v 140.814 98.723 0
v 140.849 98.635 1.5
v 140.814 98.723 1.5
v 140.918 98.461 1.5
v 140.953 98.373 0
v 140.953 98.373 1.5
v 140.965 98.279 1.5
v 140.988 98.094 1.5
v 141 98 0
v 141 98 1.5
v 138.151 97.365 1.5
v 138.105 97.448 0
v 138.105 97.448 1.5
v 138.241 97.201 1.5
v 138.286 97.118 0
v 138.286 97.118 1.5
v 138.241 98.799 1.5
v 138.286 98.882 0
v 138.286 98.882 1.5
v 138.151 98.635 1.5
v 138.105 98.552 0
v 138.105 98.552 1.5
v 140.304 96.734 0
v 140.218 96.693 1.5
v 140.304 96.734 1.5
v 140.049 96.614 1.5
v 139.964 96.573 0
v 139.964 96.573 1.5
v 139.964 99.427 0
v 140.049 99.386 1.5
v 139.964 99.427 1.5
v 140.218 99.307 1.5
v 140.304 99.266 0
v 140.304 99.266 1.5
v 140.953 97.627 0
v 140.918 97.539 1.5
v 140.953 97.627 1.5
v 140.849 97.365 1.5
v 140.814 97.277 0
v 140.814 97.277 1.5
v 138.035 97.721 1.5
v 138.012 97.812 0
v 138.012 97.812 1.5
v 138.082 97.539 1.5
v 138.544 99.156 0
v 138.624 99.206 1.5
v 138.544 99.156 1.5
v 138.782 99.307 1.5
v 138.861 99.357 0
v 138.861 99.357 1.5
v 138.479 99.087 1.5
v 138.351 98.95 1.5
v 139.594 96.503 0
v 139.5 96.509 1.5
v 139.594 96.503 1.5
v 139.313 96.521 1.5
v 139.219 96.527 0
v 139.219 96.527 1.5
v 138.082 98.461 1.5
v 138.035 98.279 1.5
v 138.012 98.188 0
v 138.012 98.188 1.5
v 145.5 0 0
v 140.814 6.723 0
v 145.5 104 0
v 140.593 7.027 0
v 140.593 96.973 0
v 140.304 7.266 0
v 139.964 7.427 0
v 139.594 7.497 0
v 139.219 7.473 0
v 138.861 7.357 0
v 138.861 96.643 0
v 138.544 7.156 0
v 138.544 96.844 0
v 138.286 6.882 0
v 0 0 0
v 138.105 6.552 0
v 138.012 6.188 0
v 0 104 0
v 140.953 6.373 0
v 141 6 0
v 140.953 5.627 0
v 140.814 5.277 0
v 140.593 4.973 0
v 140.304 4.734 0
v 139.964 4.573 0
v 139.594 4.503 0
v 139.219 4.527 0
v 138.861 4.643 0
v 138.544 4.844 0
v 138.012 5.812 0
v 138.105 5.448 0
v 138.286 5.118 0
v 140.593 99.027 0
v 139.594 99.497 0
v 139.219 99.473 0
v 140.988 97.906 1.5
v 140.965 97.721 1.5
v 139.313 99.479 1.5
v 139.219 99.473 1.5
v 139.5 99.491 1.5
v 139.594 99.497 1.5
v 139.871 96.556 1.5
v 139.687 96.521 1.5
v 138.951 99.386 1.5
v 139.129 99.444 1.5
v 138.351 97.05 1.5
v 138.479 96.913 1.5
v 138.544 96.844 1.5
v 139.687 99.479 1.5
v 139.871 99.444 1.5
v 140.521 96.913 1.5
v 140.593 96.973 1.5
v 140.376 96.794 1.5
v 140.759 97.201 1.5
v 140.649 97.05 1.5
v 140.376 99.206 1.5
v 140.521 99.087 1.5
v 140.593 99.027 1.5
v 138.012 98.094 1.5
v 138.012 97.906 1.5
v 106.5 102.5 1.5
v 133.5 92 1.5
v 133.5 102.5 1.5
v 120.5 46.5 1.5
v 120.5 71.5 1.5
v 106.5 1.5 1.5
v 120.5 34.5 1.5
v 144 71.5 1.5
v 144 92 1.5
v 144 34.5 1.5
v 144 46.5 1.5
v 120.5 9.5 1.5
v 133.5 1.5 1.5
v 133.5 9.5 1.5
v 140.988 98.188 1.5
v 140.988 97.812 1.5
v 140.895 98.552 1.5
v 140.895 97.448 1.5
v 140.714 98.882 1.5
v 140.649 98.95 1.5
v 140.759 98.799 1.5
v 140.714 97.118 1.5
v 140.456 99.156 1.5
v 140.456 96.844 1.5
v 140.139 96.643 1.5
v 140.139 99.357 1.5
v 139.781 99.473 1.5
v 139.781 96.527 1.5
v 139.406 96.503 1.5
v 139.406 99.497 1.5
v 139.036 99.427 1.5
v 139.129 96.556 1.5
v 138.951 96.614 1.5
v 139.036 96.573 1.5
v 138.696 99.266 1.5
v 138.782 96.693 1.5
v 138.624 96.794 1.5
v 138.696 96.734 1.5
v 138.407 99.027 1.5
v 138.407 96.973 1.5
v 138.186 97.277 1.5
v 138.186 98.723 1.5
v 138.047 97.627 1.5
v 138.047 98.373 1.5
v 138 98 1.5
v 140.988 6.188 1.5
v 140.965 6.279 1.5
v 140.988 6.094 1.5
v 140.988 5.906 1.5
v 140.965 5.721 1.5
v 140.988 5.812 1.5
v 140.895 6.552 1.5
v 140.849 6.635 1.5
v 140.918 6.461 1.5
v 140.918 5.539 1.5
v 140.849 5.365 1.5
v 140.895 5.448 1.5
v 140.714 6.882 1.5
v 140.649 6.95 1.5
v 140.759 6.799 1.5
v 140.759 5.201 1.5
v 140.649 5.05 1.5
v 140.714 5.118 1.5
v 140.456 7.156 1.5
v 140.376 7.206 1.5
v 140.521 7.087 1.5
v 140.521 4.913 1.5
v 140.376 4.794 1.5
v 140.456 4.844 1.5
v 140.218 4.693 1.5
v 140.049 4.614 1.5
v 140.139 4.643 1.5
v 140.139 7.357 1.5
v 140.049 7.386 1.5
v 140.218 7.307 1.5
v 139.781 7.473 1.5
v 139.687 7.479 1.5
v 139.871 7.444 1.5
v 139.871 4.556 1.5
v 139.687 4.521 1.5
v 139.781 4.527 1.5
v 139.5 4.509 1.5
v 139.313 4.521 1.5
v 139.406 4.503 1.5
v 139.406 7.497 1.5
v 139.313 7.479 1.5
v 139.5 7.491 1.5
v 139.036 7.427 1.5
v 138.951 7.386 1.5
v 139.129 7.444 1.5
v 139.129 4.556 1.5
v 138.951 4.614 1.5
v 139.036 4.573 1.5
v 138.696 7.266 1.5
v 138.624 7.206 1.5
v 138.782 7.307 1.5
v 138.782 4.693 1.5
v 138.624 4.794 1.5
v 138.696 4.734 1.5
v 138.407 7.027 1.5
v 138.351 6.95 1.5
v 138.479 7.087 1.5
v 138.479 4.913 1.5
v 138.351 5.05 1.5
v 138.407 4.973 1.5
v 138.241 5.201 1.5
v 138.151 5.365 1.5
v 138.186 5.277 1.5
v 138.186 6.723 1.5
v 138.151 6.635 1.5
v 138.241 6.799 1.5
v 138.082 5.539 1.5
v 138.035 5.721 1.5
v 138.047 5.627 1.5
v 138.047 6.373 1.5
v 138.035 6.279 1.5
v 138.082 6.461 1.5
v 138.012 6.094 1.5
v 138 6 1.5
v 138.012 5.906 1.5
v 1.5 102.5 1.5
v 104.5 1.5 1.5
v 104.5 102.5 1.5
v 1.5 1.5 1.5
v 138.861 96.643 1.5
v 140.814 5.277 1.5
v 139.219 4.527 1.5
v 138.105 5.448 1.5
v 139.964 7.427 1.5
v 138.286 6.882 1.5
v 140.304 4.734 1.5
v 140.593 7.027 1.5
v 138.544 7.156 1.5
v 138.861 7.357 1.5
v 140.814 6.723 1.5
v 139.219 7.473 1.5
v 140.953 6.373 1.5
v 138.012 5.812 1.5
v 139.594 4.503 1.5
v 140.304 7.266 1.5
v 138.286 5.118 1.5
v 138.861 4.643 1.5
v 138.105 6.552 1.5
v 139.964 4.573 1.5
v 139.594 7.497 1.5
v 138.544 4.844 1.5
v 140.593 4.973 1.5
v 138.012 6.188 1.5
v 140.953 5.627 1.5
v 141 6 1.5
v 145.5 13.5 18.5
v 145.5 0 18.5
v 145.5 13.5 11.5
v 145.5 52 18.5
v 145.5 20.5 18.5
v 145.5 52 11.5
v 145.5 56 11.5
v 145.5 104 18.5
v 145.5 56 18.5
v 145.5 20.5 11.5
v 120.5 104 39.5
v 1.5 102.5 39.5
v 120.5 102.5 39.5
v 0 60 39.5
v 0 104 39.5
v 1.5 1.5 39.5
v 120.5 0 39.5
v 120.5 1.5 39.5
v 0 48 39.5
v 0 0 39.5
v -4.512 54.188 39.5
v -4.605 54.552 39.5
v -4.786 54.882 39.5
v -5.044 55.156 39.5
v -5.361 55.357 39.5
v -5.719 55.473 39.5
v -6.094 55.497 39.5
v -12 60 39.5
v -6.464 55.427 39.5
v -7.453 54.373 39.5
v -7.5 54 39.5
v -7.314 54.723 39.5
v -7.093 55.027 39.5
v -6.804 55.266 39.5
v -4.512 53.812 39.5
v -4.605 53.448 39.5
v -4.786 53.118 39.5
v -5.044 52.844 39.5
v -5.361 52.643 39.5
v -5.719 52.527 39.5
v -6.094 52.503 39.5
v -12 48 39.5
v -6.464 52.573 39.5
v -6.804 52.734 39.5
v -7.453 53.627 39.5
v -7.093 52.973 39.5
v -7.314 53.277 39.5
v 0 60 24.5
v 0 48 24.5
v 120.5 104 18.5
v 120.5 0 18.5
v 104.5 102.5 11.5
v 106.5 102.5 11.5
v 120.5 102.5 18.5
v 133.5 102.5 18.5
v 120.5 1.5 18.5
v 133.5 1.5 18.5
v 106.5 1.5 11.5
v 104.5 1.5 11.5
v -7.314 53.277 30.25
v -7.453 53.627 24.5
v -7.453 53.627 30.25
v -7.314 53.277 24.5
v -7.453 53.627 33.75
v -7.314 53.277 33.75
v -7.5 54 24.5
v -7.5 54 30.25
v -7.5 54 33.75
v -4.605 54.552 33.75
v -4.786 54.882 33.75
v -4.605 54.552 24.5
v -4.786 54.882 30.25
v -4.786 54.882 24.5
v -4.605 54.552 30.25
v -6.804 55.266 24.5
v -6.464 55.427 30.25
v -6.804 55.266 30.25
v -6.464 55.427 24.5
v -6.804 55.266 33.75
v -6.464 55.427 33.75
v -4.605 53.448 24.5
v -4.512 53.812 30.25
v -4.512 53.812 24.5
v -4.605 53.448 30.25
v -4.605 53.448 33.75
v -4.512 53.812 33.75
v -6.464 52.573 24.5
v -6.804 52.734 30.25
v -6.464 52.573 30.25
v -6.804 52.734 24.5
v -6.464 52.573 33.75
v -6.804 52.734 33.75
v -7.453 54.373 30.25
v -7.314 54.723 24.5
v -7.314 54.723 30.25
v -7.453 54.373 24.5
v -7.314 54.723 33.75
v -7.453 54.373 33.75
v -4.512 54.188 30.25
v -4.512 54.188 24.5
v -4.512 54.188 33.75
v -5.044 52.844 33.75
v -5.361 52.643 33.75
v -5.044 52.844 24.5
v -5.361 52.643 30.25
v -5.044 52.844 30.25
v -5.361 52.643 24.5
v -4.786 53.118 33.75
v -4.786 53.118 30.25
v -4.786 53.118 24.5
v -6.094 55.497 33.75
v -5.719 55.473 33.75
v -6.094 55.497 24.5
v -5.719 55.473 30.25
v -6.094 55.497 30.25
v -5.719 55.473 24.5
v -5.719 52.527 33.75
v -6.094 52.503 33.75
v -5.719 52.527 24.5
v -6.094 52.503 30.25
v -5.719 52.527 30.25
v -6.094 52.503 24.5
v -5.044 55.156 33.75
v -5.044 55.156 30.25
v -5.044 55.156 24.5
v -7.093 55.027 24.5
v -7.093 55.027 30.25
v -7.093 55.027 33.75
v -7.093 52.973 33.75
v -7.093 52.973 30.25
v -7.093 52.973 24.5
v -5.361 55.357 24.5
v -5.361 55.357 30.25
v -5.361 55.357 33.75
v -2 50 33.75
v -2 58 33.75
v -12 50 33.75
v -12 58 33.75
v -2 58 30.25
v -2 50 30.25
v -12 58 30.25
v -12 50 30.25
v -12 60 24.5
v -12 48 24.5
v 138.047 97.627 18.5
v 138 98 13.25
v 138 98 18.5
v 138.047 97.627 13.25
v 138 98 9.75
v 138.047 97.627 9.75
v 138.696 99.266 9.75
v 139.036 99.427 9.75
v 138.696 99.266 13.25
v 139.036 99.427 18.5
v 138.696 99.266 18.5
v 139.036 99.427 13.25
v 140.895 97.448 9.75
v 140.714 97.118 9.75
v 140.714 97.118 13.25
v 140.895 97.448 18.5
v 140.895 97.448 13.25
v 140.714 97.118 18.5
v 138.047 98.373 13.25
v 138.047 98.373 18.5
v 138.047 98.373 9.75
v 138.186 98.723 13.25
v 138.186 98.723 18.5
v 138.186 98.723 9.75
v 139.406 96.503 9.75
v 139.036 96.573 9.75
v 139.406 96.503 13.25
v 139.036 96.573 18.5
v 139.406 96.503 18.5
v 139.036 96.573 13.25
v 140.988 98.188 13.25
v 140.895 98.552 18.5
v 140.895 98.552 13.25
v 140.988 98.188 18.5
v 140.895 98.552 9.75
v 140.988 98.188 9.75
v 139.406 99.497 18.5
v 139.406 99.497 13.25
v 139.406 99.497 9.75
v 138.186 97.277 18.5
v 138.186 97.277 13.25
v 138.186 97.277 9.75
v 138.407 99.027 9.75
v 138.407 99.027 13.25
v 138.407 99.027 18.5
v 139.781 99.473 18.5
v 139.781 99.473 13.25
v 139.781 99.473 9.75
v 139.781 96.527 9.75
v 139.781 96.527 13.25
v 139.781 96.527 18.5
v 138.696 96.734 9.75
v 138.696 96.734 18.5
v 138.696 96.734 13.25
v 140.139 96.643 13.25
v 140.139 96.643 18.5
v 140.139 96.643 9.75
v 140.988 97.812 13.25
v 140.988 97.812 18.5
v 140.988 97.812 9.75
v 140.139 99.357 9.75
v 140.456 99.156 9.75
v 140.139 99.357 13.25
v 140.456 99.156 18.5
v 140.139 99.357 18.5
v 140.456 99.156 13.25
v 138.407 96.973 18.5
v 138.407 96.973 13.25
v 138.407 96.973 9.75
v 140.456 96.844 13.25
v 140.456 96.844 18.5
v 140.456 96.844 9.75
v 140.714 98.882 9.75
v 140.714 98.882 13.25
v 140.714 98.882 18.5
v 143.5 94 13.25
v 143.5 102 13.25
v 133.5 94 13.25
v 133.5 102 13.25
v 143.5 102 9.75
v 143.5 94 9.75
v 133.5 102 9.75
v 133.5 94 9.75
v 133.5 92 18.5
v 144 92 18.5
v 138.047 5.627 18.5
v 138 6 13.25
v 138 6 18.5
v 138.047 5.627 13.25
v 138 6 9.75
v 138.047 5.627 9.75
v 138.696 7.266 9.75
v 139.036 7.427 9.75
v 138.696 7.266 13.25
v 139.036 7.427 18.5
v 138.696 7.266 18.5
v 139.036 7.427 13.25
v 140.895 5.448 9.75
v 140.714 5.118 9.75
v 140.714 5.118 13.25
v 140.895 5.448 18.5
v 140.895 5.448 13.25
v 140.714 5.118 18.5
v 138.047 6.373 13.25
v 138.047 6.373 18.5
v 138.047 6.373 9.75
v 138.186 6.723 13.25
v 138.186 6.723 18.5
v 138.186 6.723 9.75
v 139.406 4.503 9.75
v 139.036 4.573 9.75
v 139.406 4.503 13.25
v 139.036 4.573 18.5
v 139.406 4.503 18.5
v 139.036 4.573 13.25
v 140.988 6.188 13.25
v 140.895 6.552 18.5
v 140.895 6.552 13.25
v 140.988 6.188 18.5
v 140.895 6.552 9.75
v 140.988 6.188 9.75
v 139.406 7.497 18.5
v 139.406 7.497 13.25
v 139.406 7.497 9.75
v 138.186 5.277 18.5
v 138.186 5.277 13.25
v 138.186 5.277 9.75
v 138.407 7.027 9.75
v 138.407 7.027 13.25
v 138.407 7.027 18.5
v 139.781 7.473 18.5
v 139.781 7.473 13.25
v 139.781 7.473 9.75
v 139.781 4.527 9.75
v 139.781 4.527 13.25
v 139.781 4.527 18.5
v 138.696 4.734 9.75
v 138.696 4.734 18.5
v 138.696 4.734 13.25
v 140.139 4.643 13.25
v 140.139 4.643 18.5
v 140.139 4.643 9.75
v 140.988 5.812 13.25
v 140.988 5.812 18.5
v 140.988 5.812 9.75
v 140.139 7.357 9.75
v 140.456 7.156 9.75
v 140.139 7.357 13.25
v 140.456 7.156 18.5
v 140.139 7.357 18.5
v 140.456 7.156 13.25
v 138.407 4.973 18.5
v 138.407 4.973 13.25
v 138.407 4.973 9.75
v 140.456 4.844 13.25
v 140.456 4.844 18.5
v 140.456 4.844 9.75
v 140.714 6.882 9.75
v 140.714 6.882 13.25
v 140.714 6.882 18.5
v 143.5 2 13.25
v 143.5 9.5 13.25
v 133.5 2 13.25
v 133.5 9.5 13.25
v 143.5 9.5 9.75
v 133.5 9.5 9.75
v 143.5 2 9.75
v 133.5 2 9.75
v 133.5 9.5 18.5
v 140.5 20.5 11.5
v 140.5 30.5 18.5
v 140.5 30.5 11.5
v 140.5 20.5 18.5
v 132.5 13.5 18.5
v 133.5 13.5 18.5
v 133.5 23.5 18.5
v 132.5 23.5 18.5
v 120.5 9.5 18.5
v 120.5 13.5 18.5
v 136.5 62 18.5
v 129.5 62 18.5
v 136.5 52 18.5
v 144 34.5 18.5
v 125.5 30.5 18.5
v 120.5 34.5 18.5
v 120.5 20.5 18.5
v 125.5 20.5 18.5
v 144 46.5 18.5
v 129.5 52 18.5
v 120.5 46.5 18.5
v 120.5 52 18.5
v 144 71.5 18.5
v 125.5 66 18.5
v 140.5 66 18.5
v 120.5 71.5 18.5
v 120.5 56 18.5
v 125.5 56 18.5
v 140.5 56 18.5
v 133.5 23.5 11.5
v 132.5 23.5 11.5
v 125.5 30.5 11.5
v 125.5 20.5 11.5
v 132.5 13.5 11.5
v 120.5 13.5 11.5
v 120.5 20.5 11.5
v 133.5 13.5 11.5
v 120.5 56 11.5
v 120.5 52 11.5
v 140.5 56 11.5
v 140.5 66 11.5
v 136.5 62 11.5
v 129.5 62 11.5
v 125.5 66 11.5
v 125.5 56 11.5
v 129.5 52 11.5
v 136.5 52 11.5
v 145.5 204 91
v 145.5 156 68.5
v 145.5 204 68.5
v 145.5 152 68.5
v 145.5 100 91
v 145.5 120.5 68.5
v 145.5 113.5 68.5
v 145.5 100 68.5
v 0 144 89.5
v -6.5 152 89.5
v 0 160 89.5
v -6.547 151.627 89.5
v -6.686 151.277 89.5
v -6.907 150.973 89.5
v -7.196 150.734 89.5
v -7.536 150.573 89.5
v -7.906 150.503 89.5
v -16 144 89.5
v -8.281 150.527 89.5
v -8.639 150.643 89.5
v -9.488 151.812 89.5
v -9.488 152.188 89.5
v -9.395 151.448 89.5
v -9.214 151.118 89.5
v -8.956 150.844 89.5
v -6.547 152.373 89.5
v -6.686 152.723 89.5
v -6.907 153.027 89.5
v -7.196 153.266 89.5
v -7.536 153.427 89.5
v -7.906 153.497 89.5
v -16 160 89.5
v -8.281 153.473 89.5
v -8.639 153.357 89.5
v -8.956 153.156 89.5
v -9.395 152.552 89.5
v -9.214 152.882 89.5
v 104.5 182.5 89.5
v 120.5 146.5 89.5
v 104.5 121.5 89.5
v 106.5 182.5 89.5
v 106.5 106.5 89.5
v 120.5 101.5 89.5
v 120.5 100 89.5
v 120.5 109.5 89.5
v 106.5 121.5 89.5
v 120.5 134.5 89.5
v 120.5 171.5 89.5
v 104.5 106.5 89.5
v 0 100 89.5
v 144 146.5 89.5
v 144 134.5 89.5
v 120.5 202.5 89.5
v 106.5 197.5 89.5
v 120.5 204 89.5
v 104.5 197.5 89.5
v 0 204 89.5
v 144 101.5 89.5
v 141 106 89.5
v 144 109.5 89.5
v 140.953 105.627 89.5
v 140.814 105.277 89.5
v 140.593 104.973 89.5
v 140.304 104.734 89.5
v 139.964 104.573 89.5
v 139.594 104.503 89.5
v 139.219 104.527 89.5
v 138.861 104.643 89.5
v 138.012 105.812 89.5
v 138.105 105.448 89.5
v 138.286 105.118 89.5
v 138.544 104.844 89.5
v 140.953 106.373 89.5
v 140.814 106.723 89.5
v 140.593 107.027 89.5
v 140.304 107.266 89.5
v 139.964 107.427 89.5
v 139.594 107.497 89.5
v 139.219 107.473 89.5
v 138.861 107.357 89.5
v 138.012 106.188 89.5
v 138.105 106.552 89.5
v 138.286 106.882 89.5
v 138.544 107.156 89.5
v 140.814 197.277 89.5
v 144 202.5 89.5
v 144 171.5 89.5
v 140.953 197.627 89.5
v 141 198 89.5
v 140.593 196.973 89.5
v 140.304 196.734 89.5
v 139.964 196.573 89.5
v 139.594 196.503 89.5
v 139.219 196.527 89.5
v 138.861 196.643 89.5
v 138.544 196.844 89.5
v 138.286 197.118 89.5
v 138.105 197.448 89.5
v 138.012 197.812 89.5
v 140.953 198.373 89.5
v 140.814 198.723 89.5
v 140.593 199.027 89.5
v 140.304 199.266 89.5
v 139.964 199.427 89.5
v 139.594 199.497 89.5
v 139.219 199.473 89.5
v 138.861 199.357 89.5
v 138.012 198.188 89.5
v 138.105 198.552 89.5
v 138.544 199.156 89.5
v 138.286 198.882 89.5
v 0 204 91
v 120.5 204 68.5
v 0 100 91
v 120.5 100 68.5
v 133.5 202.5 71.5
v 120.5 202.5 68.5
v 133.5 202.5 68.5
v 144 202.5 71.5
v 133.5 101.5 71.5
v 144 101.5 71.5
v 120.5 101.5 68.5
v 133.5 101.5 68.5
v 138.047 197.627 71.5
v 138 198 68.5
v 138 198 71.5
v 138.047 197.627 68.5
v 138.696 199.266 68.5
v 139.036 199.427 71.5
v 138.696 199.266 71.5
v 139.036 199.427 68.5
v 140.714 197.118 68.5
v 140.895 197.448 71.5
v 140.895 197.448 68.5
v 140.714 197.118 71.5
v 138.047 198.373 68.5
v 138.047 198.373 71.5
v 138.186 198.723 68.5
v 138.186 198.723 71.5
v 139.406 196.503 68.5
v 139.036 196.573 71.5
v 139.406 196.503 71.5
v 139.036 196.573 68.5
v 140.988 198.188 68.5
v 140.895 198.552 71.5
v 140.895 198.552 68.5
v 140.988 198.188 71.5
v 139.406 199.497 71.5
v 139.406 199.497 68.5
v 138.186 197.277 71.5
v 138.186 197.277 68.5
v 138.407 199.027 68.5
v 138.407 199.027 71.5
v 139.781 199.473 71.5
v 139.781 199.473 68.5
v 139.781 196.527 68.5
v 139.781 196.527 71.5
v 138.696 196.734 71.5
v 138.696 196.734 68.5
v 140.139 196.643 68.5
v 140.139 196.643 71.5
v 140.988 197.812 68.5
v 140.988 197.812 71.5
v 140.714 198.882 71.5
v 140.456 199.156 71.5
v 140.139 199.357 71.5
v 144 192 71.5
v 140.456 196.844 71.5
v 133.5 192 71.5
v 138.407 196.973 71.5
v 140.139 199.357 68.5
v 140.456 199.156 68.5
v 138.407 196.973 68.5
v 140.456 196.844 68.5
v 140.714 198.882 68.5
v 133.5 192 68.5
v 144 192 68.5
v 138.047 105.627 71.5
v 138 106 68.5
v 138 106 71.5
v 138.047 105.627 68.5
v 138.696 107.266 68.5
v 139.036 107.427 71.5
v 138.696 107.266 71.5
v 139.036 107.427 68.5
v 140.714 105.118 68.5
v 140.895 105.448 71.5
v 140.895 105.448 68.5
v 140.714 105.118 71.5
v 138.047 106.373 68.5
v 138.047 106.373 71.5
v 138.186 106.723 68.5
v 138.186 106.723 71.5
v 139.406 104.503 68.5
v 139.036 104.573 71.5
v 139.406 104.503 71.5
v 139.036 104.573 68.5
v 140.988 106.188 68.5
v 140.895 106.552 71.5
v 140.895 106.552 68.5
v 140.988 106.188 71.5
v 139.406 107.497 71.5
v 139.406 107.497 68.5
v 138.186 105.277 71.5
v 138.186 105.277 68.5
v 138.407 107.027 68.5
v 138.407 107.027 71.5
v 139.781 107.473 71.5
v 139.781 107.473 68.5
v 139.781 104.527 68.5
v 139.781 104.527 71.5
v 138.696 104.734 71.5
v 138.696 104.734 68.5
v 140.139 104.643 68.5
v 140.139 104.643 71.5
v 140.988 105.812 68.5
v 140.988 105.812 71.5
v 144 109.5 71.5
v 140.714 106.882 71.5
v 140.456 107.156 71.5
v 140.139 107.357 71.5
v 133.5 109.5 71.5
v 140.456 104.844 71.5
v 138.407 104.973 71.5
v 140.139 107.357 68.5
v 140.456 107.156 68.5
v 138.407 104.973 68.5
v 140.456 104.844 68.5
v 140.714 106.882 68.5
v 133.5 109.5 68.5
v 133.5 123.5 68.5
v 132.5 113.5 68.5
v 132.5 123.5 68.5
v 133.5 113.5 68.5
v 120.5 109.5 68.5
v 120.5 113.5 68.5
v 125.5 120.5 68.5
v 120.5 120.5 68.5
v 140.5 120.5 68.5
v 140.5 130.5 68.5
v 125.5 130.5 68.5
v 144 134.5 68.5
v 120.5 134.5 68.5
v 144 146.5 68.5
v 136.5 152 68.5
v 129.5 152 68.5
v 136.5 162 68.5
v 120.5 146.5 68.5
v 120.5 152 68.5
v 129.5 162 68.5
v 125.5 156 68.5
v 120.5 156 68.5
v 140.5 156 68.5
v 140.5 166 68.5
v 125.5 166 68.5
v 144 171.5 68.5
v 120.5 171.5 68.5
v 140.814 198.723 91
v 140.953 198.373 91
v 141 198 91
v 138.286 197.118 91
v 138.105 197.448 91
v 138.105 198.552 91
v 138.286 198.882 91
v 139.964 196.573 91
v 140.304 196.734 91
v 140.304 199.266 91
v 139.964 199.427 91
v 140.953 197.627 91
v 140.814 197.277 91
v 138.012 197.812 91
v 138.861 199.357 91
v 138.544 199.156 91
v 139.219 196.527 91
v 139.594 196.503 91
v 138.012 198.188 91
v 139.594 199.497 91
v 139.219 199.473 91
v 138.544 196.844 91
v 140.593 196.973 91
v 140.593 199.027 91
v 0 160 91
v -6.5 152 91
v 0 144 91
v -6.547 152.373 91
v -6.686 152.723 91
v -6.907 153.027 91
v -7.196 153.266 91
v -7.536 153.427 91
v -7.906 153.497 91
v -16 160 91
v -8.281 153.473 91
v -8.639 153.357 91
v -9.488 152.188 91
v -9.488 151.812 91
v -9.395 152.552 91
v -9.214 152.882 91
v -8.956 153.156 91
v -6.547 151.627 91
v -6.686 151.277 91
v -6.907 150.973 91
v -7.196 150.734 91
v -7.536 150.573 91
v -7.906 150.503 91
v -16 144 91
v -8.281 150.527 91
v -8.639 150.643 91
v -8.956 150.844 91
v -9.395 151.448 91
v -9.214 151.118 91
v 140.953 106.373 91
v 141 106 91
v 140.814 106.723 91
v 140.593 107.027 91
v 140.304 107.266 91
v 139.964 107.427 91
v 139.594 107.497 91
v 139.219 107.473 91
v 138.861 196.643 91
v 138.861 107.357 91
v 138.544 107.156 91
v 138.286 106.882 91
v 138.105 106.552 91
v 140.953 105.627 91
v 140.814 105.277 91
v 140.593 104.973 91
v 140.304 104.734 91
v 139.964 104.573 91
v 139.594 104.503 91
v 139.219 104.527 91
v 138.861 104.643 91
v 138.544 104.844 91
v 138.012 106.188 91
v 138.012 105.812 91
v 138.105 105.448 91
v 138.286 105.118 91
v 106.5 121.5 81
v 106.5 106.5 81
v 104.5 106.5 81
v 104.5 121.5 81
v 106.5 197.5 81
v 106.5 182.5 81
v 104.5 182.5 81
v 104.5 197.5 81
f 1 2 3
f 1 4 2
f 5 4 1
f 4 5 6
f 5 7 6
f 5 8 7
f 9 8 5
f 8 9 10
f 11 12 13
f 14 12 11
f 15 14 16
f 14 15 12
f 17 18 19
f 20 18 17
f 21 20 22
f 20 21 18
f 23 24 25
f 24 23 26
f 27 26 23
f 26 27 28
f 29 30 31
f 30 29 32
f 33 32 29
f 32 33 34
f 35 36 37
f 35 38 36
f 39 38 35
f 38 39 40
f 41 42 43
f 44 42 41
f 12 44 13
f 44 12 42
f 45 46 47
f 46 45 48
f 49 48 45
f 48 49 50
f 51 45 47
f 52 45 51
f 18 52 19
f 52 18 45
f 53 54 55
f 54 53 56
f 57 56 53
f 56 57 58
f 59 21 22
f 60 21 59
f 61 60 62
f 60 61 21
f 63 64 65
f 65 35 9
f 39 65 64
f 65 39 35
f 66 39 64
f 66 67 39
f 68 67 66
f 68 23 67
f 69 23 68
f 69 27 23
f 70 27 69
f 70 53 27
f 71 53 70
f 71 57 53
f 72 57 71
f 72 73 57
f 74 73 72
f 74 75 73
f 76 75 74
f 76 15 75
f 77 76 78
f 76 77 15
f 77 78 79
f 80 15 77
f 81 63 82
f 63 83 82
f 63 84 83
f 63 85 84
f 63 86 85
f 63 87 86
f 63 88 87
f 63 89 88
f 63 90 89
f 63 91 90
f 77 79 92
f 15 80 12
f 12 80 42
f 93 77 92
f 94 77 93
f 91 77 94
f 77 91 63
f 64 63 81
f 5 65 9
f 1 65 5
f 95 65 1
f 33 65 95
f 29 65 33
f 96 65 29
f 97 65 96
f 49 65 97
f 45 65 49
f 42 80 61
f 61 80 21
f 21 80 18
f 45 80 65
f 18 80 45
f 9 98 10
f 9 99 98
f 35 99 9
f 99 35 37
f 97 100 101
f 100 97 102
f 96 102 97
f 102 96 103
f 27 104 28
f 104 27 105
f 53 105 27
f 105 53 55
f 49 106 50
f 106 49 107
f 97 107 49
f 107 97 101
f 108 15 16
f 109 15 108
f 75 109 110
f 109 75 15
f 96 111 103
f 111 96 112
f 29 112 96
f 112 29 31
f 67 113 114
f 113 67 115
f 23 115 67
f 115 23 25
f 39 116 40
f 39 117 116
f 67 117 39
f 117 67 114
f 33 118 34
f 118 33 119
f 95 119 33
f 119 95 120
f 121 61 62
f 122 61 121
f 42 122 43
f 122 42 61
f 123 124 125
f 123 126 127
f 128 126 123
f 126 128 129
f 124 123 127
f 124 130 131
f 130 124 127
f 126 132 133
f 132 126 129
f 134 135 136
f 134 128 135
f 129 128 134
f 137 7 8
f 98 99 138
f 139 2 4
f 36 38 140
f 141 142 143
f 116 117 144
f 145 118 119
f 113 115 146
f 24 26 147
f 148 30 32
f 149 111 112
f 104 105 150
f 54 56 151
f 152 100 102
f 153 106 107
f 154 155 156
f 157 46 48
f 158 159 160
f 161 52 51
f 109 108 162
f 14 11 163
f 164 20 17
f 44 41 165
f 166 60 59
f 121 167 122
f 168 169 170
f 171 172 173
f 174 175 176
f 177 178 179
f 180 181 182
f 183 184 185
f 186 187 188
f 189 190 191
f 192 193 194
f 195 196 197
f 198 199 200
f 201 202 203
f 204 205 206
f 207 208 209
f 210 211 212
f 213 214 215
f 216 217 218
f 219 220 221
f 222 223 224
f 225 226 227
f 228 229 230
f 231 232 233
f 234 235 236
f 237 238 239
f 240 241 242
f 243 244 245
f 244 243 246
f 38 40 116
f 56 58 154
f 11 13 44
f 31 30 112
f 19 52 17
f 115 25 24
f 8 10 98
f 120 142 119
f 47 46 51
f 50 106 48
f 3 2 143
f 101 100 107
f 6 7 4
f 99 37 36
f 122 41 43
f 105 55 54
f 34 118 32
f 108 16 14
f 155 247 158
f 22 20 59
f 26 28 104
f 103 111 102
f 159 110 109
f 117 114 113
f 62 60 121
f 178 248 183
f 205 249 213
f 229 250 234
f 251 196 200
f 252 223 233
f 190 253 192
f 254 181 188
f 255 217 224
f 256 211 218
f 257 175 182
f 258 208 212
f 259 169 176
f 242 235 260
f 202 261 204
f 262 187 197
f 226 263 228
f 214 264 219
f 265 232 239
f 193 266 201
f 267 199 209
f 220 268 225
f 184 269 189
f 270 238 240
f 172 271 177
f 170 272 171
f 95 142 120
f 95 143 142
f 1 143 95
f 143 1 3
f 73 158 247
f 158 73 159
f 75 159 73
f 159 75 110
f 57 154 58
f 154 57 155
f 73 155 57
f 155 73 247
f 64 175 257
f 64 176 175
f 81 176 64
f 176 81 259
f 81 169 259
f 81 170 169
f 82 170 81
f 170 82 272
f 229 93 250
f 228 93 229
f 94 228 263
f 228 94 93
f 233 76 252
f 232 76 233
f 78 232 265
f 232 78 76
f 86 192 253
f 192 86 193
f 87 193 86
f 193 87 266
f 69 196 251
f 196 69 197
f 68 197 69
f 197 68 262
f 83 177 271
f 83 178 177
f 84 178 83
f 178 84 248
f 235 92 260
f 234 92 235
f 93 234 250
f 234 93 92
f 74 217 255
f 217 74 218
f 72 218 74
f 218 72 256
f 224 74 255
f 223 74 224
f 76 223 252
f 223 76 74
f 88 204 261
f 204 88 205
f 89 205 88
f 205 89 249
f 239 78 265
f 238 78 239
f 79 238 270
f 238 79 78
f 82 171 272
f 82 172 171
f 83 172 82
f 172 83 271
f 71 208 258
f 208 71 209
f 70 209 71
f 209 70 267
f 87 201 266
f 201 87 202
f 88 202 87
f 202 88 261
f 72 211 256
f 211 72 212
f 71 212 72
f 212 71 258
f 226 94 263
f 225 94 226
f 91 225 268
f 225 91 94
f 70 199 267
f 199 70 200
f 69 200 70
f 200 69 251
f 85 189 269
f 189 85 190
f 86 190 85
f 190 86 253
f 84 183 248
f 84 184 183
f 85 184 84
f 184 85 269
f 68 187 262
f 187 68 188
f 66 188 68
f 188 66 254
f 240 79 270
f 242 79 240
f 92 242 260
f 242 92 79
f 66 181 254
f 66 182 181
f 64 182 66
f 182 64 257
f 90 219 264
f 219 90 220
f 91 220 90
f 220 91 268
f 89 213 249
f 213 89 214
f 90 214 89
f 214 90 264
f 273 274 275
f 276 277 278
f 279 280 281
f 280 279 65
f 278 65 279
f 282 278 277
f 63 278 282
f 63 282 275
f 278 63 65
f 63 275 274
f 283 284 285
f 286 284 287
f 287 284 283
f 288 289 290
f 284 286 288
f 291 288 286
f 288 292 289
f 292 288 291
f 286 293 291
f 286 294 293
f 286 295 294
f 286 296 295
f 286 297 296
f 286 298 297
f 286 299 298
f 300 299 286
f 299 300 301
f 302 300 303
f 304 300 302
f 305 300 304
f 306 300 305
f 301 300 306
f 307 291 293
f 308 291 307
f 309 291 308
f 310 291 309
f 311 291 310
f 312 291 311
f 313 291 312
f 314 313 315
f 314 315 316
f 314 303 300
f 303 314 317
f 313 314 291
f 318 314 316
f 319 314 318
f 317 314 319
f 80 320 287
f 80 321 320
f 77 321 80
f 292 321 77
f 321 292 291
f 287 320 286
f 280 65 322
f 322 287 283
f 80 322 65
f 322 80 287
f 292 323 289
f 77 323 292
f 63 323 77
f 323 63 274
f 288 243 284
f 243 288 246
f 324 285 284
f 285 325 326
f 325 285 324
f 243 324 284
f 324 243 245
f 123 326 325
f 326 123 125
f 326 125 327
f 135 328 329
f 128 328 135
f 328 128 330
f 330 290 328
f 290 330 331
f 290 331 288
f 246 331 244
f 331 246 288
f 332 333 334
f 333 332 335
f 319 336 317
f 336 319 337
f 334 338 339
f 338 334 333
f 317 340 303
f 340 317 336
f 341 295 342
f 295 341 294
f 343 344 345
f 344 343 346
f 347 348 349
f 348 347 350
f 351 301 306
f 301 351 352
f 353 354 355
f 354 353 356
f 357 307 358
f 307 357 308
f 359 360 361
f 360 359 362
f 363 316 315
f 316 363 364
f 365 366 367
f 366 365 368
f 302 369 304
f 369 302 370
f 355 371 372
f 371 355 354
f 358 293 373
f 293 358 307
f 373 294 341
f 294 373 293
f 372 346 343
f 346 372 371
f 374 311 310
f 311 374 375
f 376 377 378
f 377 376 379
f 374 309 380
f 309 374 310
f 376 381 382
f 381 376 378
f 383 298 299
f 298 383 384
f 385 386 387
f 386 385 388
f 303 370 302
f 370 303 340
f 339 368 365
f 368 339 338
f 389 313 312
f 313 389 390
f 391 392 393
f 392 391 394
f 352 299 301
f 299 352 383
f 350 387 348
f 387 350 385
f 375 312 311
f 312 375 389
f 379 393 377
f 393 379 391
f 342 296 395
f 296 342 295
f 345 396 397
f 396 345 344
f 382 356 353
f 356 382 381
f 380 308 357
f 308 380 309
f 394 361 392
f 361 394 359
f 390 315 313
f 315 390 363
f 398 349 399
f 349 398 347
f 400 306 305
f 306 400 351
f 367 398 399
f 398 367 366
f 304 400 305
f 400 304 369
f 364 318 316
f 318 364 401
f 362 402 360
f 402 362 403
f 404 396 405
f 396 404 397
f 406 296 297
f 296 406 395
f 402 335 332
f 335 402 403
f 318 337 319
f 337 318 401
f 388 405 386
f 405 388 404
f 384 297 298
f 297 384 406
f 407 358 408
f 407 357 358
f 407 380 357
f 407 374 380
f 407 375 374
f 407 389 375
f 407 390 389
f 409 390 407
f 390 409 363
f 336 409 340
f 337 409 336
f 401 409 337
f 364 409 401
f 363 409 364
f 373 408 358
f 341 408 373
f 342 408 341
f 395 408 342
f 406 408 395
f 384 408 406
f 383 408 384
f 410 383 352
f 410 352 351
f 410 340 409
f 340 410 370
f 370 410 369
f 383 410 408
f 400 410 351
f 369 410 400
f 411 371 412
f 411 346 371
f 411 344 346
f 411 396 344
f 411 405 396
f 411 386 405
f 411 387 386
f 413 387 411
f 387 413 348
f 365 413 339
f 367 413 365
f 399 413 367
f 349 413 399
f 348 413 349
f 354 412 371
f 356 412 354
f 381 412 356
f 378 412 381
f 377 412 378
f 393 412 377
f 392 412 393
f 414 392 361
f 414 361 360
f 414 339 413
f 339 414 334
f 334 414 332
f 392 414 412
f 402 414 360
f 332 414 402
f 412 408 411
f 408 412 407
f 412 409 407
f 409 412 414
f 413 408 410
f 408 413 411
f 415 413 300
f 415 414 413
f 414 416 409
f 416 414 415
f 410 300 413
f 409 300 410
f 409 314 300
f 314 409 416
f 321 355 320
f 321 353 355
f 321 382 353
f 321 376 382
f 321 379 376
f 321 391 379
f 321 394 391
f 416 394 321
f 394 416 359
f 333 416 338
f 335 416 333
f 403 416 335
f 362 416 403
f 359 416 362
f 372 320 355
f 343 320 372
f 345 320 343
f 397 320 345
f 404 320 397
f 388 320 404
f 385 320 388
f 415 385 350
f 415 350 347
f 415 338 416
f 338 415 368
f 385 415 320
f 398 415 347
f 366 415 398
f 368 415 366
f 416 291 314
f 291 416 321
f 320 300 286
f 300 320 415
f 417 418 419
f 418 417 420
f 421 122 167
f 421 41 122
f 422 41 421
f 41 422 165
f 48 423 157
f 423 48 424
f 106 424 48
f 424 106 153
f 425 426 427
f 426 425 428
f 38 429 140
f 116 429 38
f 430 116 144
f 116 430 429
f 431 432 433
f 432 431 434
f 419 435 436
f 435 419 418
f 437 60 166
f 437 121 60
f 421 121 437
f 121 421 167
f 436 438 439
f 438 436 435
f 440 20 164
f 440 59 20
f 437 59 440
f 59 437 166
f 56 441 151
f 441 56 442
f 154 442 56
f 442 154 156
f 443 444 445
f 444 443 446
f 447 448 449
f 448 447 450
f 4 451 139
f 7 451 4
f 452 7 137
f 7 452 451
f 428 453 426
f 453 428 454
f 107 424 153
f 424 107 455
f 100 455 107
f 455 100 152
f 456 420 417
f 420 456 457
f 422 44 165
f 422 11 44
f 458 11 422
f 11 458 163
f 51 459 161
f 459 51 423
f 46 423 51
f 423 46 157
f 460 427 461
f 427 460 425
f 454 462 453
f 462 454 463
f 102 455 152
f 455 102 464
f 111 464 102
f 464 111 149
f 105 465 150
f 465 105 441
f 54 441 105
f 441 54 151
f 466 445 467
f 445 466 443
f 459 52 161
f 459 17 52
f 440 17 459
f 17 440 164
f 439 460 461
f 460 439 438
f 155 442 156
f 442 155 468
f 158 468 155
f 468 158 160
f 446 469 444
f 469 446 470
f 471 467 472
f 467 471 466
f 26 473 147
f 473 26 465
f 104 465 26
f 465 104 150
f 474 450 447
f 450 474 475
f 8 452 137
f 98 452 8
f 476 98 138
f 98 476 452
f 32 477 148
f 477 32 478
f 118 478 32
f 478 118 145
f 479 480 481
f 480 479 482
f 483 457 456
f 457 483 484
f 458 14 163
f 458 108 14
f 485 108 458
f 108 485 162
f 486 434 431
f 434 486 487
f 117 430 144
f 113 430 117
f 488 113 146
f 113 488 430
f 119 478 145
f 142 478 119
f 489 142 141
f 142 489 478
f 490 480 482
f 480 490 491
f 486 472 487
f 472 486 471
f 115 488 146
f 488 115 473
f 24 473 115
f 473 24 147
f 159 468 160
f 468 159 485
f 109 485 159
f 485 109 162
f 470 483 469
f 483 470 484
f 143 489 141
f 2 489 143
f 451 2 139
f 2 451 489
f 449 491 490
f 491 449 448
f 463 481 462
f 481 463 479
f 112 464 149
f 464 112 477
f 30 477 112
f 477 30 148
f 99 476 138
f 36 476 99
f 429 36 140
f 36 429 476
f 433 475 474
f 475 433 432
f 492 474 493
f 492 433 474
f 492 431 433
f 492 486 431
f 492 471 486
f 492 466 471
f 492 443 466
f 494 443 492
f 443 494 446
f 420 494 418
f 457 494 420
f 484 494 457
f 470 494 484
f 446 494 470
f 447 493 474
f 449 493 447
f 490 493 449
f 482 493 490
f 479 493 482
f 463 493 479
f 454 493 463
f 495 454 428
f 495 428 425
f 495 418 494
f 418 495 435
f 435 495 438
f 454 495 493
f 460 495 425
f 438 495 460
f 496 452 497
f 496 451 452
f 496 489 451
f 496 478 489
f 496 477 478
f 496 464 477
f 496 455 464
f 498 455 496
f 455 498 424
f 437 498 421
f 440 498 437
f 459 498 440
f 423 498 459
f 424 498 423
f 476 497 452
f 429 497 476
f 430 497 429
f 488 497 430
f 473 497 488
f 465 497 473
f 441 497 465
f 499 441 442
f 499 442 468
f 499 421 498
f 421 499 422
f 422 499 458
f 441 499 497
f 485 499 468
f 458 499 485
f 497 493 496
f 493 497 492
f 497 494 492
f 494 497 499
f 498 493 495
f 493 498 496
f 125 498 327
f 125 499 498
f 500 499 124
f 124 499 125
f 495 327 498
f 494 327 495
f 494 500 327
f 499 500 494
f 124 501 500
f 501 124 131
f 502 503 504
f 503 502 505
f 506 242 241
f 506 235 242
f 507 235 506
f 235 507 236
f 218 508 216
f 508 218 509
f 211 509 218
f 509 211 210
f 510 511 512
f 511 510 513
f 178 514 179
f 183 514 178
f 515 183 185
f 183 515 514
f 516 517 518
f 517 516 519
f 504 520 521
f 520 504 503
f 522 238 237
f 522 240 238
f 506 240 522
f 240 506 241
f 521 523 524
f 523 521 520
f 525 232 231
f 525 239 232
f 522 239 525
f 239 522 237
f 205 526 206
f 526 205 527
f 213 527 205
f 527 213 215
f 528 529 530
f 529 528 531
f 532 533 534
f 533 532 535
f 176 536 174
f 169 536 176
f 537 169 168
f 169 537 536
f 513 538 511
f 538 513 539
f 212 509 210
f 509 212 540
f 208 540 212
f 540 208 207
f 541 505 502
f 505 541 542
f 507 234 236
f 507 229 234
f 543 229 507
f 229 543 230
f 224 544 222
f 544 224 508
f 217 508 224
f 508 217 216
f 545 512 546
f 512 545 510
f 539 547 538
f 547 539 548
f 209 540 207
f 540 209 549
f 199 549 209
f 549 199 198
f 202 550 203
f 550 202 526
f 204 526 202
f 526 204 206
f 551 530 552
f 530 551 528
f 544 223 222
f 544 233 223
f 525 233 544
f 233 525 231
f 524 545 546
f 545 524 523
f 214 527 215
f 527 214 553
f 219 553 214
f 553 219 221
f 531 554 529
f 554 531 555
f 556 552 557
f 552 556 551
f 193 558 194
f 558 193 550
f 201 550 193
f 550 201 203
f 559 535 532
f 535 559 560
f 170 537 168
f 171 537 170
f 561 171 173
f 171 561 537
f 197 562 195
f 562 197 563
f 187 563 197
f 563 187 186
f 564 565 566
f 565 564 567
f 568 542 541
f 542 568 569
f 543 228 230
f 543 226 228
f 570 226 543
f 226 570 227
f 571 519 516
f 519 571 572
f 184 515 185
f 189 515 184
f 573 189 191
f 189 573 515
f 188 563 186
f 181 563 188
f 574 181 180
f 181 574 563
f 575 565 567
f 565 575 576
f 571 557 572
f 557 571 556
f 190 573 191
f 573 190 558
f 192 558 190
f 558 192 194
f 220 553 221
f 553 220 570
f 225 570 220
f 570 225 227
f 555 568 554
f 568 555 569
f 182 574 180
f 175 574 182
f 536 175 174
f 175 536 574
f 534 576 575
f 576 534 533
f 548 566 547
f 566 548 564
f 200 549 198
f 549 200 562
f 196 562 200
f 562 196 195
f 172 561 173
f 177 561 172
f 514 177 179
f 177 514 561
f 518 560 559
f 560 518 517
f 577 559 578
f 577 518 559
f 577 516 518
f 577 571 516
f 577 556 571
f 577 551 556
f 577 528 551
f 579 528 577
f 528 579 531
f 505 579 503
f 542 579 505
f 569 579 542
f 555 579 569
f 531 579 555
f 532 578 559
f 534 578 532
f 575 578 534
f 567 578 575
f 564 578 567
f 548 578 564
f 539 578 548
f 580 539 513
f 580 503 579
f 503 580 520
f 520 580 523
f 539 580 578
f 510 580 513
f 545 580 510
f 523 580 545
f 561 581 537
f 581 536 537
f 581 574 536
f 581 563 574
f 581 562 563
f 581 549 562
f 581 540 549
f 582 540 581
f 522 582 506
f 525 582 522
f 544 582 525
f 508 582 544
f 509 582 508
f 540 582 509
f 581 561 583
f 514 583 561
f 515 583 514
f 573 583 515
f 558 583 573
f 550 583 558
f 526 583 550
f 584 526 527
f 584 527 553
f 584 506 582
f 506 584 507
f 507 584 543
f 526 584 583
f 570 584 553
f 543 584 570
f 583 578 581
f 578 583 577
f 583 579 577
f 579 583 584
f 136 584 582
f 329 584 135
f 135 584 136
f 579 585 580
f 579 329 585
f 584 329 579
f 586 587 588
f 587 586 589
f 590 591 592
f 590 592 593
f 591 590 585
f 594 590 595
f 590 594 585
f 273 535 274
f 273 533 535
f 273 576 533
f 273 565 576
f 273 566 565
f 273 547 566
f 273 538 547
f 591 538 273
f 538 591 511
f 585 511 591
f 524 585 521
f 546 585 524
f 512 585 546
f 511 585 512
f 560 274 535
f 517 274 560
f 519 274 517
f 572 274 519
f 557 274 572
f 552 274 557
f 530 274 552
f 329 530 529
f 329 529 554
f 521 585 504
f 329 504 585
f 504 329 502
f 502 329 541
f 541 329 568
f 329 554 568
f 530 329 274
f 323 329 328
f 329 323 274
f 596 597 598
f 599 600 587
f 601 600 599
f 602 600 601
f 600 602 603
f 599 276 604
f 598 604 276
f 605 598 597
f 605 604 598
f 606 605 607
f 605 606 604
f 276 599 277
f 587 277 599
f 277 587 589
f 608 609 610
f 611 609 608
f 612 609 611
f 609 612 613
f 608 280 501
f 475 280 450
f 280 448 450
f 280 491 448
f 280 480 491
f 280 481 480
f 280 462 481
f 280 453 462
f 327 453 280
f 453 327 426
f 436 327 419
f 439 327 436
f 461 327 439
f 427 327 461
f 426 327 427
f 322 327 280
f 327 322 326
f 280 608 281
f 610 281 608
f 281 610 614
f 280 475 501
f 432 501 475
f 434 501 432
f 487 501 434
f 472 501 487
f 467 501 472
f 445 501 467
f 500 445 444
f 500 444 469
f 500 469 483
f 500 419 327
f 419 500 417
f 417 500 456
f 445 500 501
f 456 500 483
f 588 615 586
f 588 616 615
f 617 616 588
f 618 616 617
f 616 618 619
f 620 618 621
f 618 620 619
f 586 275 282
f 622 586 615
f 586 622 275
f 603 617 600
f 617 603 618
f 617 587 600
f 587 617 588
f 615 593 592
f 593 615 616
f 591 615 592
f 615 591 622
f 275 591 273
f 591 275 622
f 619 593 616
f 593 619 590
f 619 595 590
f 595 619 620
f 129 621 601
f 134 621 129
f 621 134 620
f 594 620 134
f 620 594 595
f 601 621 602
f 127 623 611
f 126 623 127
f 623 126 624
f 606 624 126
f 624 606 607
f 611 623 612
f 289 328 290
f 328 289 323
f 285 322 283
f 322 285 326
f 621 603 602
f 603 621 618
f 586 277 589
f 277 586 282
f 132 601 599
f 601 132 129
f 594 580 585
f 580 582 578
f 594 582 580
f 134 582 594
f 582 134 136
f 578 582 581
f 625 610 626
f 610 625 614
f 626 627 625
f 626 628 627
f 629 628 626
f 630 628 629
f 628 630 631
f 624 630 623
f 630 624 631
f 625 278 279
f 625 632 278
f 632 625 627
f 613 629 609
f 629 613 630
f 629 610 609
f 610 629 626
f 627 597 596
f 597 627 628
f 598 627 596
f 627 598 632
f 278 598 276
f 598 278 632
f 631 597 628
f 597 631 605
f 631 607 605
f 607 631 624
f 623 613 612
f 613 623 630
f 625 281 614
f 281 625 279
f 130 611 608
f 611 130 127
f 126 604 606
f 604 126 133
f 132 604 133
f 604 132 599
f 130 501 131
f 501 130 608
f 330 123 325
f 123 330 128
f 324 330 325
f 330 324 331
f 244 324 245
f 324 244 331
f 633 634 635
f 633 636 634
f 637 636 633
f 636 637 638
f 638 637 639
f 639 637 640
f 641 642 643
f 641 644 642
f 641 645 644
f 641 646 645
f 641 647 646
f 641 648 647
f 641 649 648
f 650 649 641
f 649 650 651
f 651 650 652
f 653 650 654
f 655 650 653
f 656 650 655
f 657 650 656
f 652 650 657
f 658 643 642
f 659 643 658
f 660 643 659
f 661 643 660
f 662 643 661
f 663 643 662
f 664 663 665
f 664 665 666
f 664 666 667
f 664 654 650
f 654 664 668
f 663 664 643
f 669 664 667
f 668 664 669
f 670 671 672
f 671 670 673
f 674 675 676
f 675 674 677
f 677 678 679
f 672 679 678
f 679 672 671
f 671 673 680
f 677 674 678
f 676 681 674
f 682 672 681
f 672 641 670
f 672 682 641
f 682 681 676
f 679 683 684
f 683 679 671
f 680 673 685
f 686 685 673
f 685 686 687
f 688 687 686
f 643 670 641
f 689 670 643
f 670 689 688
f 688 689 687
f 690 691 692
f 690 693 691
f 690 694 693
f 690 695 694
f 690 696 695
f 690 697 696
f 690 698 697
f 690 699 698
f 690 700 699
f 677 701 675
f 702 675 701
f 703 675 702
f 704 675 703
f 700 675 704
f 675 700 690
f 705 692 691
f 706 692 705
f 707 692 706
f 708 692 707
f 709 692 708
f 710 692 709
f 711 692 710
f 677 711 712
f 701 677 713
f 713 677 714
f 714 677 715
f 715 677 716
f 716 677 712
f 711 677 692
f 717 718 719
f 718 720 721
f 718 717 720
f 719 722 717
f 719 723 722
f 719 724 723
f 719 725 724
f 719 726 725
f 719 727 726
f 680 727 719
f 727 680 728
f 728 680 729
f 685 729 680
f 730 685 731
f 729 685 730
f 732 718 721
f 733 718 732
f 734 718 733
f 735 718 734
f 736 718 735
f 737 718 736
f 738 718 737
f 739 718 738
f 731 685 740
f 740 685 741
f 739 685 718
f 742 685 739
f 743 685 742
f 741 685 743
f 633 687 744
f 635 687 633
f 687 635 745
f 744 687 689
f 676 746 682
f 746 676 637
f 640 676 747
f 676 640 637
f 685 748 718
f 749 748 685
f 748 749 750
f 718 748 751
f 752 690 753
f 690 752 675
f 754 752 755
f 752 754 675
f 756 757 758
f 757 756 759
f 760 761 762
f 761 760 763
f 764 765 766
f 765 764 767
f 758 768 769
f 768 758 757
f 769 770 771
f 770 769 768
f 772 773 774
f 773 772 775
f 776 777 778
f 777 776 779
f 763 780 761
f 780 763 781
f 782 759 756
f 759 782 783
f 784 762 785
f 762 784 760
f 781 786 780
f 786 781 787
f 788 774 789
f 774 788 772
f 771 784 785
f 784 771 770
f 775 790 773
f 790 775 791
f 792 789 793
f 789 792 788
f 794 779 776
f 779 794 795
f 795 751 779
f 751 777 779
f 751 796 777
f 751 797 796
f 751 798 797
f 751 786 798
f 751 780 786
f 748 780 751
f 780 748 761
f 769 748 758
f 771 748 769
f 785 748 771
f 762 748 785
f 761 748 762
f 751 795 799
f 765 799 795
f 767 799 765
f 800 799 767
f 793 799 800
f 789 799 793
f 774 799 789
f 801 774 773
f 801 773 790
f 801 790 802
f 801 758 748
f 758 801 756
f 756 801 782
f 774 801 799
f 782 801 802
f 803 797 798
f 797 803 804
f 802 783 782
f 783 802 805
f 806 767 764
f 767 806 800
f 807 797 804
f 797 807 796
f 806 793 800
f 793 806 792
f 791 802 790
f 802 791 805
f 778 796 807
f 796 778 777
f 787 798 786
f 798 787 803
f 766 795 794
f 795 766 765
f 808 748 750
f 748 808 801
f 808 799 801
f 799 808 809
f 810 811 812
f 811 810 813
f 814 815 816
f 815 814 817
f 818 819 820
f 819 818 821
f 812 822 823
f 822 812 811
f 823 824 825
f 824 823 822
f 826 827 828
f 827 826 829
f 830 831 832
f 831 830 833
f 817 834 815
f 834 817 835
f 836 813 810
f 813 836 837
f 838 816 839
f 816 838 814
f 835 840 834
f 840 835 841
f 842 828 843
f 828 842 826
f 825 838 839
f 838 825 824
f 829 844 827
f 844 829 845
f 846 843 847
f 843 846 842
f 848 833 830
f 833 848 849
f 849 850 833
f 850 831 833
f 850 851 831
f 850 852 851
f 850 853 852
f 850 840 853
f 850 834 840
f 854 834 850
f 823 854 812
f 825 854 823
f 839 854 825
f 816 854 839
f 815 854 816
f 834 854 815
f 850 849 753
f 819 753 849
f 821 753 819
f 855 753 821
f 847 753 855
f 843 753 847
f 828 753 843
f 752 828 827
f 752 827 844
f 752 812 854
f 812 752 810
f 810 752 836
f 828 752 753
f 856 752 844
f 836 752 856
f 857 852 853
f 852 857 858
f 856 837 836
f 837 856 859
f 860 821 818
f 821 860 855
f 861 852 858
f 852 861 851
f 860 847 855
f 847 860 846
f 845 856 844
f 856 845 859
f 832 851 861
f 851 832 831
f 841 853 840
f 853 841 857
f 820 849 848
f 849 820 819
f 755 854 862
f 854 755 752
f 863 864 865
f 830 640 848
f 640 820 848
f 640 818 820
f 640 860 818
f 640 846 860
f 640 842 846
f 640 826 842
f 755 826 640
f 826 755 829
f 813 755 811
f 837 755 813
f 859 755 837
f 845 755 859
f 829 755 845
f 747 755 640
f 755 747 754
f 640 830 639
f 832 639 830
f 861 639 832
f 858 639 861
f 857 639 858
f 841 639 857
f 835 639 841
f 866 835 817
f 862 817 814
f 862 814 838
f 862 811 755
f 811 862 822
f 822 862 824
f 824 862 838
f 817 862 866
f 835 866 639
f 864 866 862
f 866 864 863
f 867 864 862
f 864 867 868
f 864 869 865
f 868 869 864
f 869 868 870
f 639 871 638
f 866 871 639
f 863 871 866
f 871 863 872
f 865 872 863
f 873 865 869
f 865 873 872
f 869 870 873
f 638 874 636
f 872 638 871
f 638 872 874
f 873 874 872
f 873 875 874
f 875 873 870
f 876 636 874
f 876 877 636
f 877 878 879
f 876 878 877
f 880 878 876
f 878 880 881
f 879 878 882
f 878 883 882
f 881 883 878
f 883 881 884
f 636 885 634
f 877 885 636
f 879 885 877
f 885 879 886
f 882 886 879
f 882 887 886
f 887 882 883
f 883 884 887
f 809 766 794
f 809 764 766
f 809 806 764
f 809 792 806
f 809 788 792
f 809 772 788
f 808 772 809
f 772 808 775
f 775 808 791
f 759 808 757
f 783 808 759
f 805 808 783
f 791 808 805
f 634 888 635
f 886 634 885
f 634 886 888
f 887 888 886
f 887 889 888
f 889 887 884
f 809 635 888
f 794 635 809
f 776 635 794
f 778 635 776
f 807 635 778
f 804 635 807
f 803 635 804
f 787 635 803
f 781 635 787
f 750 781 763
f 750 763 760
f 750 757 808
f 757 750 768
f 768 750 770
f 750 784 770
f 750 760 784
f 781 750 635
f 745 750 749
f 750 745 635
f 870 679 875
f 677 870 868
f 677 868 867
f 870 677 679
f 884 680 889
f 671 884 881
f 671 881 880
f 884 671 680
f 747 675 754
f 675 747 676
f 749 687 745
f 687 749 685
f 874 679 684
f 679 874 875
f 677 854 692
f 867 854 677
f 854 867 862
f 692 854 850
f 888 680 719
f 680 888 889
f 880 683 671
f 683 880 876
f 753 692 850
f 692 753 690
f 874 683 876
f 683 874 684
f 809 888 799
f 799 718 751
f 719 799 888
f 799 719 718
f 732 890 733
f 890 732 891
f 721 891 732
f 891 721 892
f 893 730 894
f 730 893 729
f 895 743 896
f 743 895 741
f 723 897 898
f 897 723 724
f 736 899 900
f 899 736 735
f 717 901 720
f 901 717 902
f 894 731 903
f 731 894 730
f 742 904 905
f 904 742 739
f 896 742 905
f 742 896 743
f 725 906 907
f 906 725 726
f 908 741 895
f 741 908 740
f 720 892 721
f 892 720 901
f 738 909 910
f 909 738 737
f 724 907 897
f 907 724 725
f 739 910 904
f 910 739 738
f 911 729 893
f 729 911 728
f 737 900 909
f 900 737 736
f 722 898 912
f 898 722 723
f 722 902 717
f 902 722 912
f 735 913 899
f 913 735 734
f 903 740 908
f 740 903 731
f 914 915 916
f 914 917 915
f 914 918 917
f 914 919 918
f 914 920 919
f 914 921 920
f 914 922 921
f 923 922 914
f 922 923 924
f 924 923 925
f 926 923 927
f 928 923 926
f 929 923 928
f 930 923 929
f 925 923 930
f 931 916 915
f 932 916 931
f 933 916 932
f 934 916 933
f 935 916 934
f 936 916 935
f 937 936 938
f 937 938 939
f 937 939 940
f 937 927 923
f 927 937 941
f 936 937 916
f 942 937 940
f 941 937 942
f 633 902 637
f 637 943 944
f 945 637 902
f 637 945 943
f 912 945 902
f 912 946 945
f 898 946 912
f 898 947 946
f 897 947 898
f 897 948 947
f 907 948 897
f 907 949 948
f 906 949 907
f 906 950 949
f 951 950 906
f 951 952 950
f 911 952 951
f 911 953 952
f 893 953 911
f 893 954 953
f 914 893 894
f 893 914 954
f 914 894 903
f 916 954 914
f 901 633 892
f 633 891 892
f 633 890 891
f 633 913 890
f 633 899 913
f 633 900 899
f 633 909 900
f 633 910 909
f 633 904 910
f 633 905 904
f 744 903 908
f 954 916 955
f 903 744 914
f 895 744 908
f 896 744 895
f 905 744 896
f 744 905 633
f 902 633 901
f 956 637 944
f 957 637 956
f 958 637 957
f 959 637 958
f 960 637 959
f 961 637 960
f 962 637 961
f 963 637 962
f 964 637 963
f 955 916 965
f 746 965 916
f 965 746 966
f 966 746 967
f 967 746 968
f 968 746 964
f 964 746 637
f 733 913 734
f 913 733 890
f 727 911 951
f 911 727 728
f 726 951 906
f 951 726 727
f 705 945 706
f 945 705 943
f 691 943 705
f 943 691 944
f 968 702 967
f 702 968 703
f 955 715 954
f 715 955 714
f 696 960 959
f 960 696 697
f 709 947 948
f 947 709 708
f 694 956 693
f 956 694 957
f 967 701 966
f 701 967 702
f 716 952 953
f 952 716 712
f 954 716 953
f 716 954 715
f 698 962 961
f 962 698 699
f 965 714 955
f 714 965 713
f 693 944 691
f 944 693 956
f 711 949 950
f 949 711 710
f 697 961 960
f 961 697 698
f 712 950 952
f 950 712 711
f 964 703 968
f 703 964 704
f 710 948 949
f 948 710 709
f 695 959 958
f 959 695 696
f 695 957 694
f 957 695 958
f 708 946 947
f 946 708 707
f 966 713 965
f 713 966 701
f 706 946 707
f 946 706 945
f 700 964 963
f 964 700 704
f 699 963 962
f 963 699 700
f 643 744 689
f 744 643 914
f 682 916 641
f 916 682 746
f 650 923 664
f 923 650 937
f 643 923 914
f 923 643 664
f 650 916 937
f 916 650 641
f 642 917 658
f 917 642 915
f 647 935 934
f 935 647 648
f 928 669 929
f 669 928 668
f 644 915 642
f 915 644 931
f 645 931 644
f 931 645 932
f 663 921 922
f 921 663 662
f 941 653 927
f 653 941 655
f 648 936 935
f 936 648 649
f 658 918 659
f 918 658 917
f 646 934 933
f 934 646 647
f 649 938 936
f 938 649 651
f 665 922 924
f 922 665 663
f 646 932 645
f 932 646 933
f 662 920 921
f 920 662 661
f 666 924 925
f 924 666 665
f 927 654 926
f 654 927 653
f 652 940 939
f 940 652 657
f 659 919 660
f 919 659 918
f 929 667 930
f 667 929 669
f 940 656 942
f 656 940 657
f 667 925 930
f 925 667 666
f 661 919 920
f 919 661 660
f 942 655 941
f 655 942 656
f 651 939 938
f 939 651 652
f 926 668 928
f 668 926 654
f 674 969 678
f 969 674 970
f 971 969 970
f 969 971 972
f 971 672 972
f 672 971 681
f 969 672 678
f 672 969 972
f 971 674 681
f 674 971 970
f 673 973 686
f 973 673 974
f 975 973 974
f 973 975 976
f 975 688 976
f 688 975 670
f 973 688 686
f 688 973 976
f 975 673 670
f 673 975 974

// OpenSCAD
$fn=25;


powerSupplyWidth = 101;
powerSupplyDepth = 99;
powerSupplyHeight = 36;




nutBoxHeight = 15;
screwRange = 1.5;
screwLength = 40;
nutRange = 4;
nutHeight = 3.5;

boxMargin = 1;

wallThickness = 1.5;
bottomThickness = 1.5;

widthMargin = 16;
antiPullGuiderWidth = 25;
antiPullOpeningY = 10;
antiPullOpeningHeight = 7;



cutHeight = antiPullOpeningY + antiPullOpeningHeight + bottomThickness;


// Bottom Part
difference() {
    box();
    translate([powerSupplyWidth + widthMargin + boxMargin * 2 + wallThickness, 0, cutHeight])
    cube([500, 500, 500]);
}


// Top part
translate([0, 100, 50])
{
    intersection() {
        box();
        translate([powerSupplyWidth + widthMargin + boxMargin * 2 + wallThickness, 0, cutHeight])
        cube([500, 500, 500]);
    }
    
    translate([0, 0, powerSupplyHeight + boxMargin * 2 + bottomThickness])
    {
        difference() {
            cube([
                powerSupplyWidth + widthMargin + antiPullGuiderWidth + boxMargin * 2 + wallThickness, 
                powerSupplyDepth + (boxMargin + wallThickness) * 2,
                bottomThickness
            ]);
              translate([powerSupplyWidth + widthMargin + antiPullGuiderWidth + boxMargin * 2 + wallThickness - 6, 
            powerSupplyDepth + (boxMargin + wallThickness) * 2 - 6, 
            0]) {
                cylinder(r=screwRange, h=bottomThickness);
                translate([0, -92, 0])
                cylinder(r=screwRange, h=bottomThickness);
            }
        }

        translate([-16, powerSupplyDepth/2 + (boxMargin + wallThickness) - 16 /2, 0])
        difference() {
            cube([
                16,
                16,
                bottomThickness
            ]);
            translate([8, 8, 0])
            cylinder(h=bottomThickness, r=screwRange);
        }
        
        holderWidth = 15;
        translate([powerSupplyWidth + boxMargin * 2 + wallThickness, wallThickness + 5, bottomThickness - 10]) {
            cube([2, holderWidth, 10]);
            translate([0, powerSupplyDepth + boxMargin * 2 - 5 * 2 - holderWidth, 0])
            cube([2, holderWidth, 10]);
        }
    }
}


module box() {

    difference() {
        cube([
            powerSupplyWidth + widthMargin + antiPullGuiderWidth + boxMargin * 2 + wallThickness, 
            powerSupplyDepth + (boxMargin + wallThickness) * 2,
            powerSupplyHeight + boxMargin * 2 + bottomThickness, 
        ]);
        translate([wallThickness, wallThickness, bottomThickness]) {
            cube([
                powerSupplyWidth + widthMargin + antiPullGuiderWidth + (boxMargin) * 2, 
                powerSupplyDepth + (boxMargin) * 2,
                powerSupplyHeight + boxMargin * 2, 
            ]);
        }
        
        translate([powerSupplyWidth + widthMargin + antiPullGuiderWidth + boxMargin * 2 + wallThickness - 6, 
        powerSupplyDepth + (boxMargin + wallThickness) * 2 - 6, 
        0]) {
            cylinder(r=screwRange, h=bottomThickness);
            translate([0, -92, 0])
            cylinder(r=screwRange, h=bottomThickness);
        }
    }


    // Connection points
    translate([
        0, 
        powerSupplyDepth / 2 + (boxMargin + wallThickness) + 16/2, 
        powerSupplyHeight + boxMargin * 2 + bottomThickness - nutBoxHeight])
    {
        rotate([0, 0, 180])
        connectionPoint(screwRange, screwLength, nutRange, nutHeight, nutBoxHeight);
    }


    translate([
        powerSupplyWidth + widthMargin + antiPullGuiderWidth + boxMargin * 2 + wallThickness, 
        powerSupplyDepth + (boxMargin + wallThickness) * 2, 
        bottomThickness])
    {
        rotate([0, 0, 180])
        {
            
            connectionPoint(screwRange, screwLength, nutRange, nutHeight, cutHeight - bottomThickness + 3);
            translate([0, 92, 0])
            connectionPoint(screwRange, screwLength, nutRange, nutHeight, cutHeight - bottomThickness + 3);
        }
    }




    translate([powerSupplyWidth + boxMargin * 2 + wallThickness, wallThickness, bottomThickness]) {
        cube([2, powerSupplyDepth + boxMargin * 2, 10]);
        
      
        translate([widthMargin, 0, 0]) {
            translate([0, 8, 0])            
            antiPullGuider(antiPullGuiderWidth, 25, powerSupplyHeight + 2 * boxMargin, 7, antiPullOpeningHeight, antiPullOpeningY);
            translate([0, 45, 0])
            antiPullGuider(antiPullGuiderWidth, 25, powerSupplyHeight + 2 * boxMargin, 4, antiPullOpeningHeight, antiPullOpeningY);


            translate([antiPullGuiderWidth - wallThickness, 0, 0]) {
                cube([wallThickness, 10, powerSupplyHeight + boxMargin * 2]);
                translate([0, 30, 0])
                cube([wallThickness, 15, powerSupplyHeight + boxMargin * 2]);
                translate([0, 25 + 40, 0])
                cube([wallThickness, powerSupplyDepth + boxMargin * 2 - (25 + 40),      powerSupplyHeight + boxMargin * 2]);
            }
            

        }
    }
}




module connectionPoint(screwRange, screwLength, nutRange, nutHeight, height) {
    padding = 3 + 1.5;
    width = screwRange * 2 + padding * 2;
    depth = screwRange * 2 + padding * 2;
    
    difference() {
        cube([width, depth, height]);
        
        translate([width / 2, depth / 2, 0])
        {
            translate([0, 0, height - screwLength])
            cylinder(r=screwRange, h=screwLength);

            translate([-nutRange, -nutRange, height / 2 - nutHeight / 2])        
            cube([width, nutRange * 2, nutHeight]);
        }
    }
}

module antiPullGuider(width, depth, height, pathThickness, pathHeight, holeOffsetY) {
    bendDepth = 10;
    bendWidth = 15;
    xPadding = (width - bendWidth) / 2;
    yPadding = (depth - bendDepth) / 2;
    
    difference() {
        cube([width, depth, height]);
        
        
        translate([0, yPadding - pathThickness / 2, holeOffsetY]) {
            cube([xPadding, pathThickness, pathHeight]);
            translate([xPadding, 0, 0]) {
                cube([pathThickness, bendDepth, pathHeight]);
                translate([0, bendDepth, 0]) {
                    cube([bendWidth, pathThickness, pathHeight]);
                     
                    translate([bendWidth - pathThickness, -bendDepth, 0])
                    cube([pathThickness, bendDepth, pathHeight]);
                }   
                
            }
            translate([width - xPadding, 0, 0]) {
                cube([xPadding, pathThickness, pathHeight]);
            }
        }
    }
}
